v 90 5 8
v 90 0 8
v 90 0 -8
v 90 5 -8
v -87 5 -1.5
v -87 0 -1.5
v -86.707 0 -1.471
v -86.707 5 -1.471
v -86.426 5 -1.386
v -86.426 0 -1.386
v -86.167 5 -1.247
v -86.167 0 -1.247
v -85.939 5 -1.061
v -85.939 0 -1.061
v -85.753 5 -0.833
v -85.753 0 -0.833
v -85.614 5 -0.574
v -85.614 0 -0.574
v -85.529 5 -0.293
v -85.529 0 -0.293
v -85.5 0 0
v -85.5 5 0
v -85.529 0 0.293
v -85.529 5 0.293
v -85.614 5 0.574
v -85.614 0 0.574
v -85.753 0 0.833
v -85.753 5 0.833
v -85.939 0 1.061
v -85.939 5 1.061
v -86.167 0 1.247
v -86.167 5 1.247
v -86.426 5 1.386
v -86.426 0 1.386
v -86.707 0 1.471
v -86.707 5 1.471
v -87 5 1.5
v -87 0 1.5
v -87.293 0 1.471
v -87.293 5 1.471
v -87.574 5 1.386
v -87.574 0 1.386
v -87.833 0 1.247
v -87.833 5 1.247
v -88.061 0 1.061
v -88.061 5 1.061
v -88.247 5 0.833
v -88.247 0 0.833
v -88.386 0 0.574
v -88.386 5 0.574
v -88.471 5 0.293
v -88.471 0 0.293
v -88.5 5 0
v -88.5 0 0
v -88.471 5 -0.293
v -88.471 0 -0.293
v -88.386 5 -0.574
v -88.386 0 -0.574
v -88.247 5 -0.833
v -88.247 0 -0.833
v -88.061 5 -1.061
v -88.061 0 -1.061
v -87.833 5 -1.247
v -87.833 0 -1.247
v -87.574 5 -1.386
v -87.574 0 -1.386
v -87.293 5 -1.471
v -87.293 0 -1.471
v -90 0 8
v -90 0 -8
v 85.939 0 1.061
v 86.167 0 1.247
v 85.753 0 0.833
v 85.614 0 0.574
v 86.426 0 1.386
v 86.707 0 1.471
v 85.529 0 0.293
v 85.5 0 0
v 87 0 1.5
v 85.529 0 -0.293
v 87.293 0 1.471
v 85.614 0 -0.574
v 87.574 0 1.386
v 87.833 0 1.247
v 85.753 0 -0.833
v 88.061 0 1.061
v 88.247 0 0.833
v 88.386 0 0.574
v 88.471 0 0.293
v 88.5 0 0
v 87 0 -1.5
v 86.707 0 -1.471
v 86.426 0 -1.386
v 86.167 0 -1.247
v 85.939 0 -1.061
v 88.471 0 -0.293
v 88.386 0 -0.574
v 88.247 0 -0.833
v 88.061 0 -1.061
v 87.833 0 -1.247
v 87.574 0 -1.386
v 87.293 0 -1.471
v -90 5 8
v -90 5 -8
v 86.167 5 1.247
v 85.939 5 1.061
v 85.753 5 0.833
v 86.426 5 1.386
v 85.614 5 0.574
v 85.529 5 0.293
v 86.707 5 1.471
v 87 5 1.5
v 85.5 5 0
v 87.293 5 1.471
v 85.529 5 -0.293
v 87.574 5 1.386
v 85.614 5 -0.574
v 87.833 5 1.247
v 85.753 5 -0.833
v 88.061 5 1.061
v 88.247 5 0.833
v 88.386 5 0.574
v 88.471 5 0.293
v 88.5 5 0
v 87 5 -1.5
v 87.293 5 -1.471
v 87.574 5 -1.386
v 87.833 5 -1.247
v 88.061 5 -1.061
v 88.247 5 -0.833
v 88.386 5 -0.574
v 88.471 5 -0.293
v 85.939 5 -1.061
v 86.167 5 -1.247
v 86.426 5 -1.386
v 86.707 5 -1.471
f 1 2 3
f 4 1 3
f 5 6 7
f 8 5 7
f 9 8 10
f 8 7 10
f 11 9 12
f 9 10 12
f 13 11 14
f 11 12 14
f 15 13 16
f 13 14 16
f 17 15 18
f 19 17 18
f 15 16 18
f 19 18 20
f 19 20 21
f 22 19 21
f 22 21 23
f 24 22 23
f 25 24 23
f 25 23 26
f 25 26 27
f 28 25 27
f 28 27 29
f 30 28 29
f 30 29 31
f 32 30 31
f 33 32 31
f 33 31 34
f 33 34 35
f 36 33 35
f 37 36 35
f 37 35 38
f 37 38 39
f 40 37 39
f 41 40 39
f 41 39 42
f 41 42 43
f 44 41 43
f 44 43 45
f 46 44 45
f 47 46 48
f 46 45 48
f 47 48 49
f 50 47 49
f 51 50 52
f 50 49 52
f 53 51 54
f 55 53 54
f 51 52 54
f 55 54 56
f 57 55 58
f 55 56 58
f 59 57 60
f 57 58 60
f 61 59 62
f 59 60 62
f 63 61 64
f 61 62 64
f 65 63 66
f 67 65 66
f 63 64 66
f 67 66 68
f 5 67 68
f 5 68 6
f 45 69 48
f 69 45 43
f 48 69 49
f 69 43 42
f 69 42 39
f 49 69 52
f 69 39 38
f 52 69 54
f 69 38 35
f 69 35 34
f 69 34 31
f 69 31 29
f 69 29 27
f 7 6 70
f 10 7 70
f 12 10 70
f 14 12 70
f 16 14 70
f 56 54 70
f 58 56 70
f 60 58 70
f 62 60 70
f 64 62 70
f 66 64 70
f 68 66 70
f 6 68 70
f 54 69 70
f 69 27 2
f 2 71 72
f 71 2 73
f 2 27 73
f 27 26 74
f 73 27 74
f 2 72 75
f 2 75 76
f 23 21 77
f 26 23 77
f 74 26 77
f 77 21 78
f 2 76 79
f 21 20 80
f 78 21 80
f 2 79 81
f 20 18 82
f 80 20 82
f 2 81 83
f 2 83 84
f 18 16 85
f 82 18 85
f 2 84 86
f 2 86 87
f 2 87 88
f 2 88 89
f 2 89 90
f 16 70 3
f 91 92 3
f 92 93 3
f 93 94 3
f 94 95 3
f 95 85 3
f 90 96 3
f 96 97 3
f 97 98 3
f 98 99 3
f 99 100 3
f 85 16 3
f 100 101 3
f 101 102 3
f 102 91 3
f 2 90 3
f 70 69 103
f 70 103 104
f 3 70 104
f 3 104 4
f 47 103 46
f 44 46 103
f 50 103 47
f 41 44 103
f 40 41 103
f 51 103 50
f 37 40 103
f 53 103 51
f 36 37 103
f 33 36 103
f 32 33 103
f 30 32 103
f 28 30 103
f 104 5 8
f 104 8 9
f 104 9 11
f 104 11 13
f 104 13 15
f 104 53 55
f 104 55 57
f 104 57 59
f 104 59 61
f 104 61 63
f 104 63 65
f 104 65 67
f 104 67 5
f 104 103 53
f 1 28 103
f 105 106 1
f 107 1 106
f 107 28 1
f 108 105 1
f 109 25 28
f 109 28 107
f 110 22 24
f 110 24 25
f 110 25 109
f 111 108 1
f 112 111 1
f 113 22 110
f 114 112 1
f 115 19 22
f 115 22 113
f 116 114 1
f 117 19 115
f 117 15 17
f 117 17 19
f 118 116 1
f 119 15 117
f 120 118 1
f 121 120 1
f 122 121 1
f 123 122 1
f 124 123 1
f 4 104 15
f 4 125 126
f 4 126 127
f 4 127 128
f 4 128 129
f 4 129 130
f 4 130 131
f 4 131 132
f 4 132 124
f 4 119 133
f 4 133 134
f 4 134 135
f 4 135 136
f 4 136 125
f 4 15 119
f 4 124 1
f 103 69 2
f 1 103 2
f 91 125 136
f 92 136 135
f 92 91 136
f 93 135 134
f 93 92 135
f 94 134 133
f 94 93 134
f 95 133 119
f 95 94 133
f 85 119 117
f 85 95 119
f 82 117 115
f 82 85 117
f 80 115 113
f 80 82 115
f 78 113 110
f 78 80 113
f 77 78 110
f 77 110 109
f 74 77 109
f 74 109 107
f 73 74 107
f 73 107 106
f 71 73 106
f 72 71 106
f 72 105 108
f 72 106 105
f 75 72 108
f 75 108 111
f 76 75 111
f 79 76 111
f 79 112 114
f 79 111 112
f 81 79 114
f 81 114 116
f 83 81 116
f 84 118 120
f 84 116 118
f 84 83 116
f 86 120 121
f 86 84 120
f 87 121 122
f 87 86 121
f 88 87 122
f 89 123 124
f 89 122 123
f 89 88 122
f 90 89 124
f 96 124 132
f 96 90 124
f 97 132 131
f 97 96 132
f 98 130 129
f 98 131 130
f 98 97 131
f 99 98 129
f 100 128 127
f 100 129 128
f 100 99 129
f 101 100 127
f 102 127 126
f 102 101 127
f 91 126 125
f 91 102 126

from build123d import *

# Parameters (mm, degrees)
CROQUIS1_W              = 180
CROQUIS1_H              = 16
SALIENTE_EXTRUIR1_DEPTH = 5
CROQUIS2_R              = 1.5
CORTAR_EXTRUIR1_DEPTH   = 91.493093659


with BuildPart() as part:
    # Croquis1 → Saliente-Extruir1 (new body)
    with BuildSketch(Plane(origin=(0, 0, 0), x_dir=(1, 0, 0), z_dir=(0, 1, 0))):
        Rectangle(CROQUIS1_W, CROQUIS1_H)
    extrude(amount=SALIENTE_EXTRUIR1_DEPTH)

    # Croquis2 → Cortar-Extruir1 (cut, through all)
    with BuildSketch(Plane.XZ):
        with Locations(Location((-87, 0, 0), (0, 0, 270))):
            Circle(CROQUIS2_R)
    cortar_extruir1 = extrude(amount=-CORTAR_EXTRUIR1_DEPTH, mode=Mode.SUBTRACT)

    # Simetría1: Cortar-Extruir1 across plane
    add(cortar_extruir1.mirror(Plane(origin=(0, 0, 0), x_dir=(0, 0, 1), z_dir=(1, 0, 0))), mode=Mode.SUBTRACT)


solid = part.part
